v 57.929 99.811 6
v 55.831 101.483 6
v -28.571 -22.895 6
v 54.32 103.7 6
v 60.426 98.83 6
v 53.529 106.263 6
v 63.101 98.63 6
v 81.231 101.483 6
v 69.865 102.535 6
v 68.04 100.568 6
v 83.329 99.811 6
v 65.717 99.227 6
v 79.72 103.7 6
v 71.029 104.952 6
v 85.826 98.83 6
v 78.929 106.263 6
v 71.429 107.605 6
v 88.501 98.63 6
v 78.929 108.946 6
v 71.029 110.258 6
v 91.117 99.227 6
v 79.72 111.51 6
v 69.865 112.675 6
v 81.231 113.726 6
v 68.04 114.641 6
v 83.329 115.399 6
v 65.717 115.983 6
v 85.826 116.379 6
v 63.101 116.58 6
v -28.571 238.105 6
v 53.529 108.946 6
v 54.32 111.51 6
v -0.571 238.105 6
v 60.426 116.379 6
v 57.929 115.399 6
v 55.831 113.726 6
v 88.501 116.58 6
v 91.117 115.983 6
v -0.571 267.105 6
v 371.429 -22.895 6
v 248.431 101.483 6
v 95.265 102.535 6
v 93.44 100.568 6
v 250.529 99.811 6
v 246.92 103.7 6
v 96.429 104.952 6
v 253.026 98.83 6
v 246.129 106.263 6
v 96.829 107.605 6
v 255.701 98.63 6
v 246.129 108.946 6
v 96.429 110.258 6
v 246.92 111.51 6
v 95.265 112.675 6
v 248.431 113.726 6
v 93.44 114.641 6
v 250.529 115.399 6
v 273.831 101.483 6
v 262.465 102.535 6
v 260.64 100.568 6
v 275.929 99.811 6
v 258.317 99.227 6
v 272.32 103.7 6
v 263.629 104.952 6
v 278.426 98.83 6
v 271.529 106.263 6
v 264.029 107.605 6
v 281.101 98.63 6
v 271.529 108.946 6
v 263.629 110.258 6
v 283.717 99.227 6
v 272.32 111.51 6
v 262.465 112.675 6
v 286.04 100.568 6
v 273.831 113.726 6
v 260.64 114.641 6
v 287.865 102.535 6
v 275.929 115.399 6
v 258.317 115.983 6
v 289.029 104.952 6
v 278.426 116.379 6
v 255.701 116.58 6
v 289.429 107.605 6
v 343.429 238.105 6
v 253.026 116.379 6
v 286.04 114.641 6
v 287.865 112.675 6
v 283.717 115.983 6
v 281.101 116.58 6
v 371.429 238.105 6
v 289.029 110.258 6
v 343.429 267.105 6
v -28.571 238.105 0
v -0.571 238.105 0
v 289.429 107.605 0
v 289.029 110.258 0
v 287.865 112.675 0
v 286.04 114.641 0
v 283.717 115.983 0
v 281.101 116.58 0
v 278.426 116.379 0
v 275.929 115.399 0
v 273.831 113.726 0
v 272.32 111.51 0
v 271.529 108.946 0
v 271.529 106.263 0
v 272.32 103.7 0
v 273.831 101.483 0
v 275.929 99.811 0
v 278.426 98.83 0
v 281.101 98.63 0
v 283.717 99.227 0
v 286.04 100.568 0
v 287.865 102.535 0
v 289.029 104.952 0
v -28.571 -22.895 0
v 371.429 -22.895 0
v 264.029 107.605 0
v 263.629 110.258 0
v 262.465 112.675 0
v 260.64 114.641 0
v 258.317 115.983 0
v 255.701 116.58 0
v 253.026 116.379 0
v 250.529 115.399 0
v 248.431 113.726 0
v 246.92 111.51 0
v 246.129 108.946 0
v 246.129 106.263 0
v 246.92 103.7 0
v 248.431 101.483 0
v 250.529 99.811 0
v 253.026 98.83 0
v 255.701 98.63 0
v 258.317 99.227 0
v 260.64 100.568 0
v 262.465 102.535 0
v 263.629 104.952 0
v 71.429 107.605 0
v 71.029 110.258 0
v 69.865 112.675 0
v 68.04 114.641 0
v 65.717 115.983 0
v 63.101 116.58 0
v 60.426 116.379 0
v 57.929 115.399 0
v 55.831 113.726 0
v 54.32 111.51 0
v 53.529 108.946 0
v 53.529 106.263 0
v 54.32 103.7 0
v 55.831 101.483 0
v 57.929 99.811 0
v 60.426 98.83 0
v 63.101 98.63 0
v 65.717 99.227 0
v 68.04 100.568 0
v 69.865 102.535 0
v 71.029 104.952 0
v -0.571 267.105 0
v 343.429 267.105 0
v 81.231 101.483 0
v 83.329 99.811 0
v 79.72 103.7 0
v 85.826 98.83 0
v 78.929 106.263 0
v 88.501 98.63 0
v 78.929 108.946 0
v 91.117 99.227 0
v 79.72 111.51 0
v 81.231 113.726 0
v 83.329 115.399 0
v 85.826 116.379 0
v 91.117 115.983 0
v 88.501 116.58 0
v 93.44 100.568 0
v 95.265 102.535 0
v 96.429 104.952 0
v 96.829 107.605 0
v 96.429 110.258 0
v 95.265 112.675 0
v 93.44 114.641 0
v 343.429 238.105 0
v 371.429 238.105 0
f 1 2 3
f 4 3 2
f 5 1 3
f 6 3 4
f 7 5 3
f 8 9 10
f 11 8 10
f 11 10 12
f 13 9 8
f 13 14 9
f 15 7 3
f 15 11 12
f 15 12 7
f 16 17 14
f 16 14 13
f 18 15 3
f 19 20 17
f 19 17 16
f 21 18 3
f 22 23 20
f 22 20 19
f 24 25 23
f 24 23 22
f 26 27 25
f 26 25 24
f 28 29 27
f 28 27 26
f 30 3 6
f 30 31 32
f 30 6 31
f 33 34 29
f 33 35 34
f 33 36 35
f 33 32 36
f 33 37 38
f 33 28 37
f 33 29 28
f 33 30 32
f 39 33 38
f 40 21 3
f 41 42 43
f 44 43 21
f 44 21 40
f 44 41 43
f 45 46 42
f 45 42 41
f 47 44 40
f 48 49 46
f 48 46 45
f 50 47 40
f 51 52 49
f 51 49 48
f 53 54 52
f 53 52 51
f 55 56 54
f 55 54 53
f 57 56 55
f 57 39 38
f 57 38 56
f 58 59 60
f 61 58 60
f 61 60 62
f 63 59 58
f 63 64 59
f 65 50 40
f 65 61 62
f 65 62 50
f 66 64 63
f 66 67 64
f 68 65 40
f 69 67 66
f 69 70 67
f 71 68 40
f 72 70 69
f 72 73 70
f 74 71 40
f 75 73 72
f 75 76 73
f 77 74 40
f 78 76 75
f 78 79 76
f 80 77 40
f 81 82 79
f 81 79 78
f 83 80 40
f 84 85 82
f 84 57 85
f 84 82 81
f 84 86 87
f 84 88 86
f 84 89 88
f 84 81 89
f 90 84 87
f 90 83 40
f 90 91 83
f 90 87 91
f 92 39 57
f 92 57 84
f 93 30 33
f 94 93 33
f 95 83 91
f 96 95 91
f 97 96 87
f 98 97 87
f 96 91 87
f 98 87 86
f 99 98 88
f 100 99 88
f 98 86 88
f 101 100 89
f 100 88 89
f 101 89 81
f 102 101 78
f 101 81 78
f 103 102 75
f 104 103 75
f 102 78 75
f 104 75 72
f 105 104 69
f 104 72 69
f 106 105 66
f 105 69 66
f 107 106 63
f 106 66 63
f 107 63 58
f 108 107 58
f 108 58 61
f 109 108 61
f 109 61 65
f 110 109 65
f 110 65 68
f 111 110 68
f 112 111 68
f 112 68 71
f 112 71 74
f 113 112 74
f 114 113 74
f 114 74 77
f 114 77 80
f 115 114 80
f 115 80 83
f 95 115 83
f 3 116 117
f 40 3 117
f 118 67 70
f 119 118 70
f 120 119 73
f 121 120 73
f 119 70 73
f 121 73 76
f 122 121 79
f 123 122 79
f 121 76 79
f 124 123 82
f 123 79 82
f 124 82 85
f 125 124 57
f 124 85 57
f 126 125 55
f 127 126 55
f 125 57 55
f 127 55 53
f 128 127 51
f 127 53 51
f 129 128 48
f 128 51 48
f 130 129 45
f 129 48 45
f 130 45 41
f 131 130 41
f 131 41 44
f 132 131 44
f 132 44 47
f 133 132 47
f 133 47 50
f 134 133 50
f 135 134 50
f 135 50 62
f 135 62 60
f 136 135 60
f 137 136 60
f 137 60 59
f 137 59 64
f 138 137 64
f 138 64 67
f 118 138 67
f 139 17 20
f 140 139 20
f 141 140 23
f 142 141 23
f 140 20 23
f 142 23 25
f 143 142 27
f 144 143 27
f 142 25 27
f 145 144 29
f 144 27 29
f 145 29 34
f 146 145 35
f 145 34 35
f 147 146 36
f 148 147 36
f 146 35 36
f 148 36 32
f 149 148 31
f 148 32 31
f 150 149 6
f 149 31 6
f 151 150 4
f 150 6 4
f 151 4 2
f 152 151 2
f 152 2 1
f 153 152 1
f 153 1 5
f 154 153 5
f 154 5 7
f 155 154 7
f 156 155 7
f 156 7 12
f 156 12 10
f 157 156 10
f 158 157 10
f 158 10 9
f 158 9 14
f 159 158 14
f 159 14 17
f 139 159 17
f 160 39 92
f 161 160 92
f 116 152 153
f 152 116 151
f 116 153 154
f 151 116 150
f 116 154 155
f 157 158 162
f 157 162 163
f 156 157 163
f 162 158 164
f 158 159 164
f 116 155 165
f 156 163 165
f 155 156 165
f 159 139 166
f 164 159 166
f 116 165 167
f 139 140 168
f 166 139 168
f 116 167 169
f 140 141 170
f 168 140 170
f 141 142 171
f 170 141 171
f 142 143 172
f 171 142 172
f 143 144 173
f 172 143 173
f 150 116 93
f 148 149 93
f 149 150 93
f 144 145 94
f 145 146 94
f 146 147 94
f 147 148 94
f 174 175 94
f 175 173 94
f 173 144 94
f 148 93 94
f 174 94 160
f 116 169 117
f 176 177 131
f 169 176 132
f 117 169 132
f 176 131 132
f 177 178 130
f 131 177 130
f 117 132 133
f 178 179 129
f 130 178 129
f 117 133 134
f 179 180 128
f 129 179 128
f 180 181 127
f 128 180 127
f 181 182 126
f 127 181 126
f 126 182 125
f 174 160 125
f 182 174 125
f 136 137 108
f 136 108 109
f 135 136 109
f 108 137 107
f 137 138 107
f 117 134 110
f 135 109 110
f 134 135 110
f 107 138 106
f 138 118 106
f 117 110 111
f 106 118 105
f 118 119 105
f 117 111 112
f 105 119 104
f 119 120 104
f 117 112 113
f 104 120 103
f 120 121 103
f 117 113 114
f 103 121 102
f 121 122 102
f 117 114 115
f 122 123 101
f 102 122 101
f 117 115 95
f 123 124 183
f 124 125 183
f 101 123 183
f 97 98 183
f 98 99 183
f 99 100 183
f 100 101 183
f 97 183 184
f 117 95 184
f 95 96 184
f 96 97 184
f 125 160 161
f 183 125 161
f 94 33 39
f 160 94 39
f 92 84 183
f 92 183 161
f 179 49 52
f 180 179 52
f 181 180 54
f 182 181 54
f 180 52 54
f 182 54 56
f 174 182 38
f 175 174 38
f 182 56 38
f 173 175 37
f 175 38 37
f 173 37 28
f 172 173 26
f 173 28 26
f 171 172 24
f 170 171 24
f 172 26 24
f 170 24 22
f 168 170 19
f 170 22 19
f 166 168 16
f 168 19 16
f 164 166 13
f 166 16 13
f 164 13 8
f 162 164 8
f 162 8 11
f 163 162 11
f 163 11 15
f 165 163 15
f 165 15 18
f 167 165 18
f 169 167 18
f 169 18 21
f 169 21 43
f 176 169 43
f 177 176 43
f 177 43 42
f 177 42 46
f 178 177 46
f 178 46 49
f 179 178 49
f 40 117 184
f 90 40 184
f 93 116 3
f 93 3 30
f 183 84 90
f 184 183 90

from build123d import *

# Parameters (mm, degrees)
SKETCH1_W           = 400
SKETCH1_H           = 281
BOSS_EXTRUDE1_DEPTH = 6
SKETCH2_W           = 28
SKETCH2_H           = 20
CUT_EXTRUDE1_DEPTH  = 10
SKETCH3_W           = 344
SKETCH3_H           = 9
BOSS_EXTRUDE2_DEPTH = 6
SKETCH4_R           = 9
CUT_EXTRUDE2_DEPTH  = 10


with BuildPart() as part:
    # Sketch1 → Boss-Extrude1 (new body)
    with BuildSketch(Plane.XY):
        with Locations((171.428571429, 117.604761905)):
            Rectangle(SKETCH1_W, SKETCH1_H)
    extrude(amount=BOSS_EXTRUDE1_DEPTH)

    # Sketch2 → Cut-Extrude1 (cut)
    with BuildSketch(Plane.XY.offset(6)):
        with Locations((-14.571428571, 248.104761905)):
            Rectangle(SKETCH2_W, SKETCH2_H)
        with Locations((357.428571429, 248.104761905)):
            Rectangle(SKETCH2_W, SKETCH2_H)
    extrude(amount=-CUT_EXTRUDE1_DEPTH, mode=Mode.SUBTRACT)

    # Sketch3 → Boss-Extrude2 (add)
    with BuildSketch(Plane.XY.offset(6)):
        with Locations((171.428571429, 262.604761905)):
            Rectangle(SKETCH3_W, SKETCH3_H)
    extrude(amount=-BOSS_EXTRUDE2_DEPTH)

    # Sketch4 → Cut-Extrude2 (cut)
    with BuildSketch(Plane.XY.offset(6)):
        with Locations((62.428571429, 107.604761905)):
            Circle(SKETCH4_R)
        with Locations((87.828571429, 107.604761905)):
            Circle(SKETCH4_R)
        with Locations((255.028571429, 107.604761905)):
            Circle(SKETCH4_R)
        with Locations((280.428571429, 107.604761905)):
            Circle(SKETCH4_R)
    extrude(amount=-CUT_EXTRUDE2_DEPTH, mode=Mode.SUBTRACT)


solid = part.part
